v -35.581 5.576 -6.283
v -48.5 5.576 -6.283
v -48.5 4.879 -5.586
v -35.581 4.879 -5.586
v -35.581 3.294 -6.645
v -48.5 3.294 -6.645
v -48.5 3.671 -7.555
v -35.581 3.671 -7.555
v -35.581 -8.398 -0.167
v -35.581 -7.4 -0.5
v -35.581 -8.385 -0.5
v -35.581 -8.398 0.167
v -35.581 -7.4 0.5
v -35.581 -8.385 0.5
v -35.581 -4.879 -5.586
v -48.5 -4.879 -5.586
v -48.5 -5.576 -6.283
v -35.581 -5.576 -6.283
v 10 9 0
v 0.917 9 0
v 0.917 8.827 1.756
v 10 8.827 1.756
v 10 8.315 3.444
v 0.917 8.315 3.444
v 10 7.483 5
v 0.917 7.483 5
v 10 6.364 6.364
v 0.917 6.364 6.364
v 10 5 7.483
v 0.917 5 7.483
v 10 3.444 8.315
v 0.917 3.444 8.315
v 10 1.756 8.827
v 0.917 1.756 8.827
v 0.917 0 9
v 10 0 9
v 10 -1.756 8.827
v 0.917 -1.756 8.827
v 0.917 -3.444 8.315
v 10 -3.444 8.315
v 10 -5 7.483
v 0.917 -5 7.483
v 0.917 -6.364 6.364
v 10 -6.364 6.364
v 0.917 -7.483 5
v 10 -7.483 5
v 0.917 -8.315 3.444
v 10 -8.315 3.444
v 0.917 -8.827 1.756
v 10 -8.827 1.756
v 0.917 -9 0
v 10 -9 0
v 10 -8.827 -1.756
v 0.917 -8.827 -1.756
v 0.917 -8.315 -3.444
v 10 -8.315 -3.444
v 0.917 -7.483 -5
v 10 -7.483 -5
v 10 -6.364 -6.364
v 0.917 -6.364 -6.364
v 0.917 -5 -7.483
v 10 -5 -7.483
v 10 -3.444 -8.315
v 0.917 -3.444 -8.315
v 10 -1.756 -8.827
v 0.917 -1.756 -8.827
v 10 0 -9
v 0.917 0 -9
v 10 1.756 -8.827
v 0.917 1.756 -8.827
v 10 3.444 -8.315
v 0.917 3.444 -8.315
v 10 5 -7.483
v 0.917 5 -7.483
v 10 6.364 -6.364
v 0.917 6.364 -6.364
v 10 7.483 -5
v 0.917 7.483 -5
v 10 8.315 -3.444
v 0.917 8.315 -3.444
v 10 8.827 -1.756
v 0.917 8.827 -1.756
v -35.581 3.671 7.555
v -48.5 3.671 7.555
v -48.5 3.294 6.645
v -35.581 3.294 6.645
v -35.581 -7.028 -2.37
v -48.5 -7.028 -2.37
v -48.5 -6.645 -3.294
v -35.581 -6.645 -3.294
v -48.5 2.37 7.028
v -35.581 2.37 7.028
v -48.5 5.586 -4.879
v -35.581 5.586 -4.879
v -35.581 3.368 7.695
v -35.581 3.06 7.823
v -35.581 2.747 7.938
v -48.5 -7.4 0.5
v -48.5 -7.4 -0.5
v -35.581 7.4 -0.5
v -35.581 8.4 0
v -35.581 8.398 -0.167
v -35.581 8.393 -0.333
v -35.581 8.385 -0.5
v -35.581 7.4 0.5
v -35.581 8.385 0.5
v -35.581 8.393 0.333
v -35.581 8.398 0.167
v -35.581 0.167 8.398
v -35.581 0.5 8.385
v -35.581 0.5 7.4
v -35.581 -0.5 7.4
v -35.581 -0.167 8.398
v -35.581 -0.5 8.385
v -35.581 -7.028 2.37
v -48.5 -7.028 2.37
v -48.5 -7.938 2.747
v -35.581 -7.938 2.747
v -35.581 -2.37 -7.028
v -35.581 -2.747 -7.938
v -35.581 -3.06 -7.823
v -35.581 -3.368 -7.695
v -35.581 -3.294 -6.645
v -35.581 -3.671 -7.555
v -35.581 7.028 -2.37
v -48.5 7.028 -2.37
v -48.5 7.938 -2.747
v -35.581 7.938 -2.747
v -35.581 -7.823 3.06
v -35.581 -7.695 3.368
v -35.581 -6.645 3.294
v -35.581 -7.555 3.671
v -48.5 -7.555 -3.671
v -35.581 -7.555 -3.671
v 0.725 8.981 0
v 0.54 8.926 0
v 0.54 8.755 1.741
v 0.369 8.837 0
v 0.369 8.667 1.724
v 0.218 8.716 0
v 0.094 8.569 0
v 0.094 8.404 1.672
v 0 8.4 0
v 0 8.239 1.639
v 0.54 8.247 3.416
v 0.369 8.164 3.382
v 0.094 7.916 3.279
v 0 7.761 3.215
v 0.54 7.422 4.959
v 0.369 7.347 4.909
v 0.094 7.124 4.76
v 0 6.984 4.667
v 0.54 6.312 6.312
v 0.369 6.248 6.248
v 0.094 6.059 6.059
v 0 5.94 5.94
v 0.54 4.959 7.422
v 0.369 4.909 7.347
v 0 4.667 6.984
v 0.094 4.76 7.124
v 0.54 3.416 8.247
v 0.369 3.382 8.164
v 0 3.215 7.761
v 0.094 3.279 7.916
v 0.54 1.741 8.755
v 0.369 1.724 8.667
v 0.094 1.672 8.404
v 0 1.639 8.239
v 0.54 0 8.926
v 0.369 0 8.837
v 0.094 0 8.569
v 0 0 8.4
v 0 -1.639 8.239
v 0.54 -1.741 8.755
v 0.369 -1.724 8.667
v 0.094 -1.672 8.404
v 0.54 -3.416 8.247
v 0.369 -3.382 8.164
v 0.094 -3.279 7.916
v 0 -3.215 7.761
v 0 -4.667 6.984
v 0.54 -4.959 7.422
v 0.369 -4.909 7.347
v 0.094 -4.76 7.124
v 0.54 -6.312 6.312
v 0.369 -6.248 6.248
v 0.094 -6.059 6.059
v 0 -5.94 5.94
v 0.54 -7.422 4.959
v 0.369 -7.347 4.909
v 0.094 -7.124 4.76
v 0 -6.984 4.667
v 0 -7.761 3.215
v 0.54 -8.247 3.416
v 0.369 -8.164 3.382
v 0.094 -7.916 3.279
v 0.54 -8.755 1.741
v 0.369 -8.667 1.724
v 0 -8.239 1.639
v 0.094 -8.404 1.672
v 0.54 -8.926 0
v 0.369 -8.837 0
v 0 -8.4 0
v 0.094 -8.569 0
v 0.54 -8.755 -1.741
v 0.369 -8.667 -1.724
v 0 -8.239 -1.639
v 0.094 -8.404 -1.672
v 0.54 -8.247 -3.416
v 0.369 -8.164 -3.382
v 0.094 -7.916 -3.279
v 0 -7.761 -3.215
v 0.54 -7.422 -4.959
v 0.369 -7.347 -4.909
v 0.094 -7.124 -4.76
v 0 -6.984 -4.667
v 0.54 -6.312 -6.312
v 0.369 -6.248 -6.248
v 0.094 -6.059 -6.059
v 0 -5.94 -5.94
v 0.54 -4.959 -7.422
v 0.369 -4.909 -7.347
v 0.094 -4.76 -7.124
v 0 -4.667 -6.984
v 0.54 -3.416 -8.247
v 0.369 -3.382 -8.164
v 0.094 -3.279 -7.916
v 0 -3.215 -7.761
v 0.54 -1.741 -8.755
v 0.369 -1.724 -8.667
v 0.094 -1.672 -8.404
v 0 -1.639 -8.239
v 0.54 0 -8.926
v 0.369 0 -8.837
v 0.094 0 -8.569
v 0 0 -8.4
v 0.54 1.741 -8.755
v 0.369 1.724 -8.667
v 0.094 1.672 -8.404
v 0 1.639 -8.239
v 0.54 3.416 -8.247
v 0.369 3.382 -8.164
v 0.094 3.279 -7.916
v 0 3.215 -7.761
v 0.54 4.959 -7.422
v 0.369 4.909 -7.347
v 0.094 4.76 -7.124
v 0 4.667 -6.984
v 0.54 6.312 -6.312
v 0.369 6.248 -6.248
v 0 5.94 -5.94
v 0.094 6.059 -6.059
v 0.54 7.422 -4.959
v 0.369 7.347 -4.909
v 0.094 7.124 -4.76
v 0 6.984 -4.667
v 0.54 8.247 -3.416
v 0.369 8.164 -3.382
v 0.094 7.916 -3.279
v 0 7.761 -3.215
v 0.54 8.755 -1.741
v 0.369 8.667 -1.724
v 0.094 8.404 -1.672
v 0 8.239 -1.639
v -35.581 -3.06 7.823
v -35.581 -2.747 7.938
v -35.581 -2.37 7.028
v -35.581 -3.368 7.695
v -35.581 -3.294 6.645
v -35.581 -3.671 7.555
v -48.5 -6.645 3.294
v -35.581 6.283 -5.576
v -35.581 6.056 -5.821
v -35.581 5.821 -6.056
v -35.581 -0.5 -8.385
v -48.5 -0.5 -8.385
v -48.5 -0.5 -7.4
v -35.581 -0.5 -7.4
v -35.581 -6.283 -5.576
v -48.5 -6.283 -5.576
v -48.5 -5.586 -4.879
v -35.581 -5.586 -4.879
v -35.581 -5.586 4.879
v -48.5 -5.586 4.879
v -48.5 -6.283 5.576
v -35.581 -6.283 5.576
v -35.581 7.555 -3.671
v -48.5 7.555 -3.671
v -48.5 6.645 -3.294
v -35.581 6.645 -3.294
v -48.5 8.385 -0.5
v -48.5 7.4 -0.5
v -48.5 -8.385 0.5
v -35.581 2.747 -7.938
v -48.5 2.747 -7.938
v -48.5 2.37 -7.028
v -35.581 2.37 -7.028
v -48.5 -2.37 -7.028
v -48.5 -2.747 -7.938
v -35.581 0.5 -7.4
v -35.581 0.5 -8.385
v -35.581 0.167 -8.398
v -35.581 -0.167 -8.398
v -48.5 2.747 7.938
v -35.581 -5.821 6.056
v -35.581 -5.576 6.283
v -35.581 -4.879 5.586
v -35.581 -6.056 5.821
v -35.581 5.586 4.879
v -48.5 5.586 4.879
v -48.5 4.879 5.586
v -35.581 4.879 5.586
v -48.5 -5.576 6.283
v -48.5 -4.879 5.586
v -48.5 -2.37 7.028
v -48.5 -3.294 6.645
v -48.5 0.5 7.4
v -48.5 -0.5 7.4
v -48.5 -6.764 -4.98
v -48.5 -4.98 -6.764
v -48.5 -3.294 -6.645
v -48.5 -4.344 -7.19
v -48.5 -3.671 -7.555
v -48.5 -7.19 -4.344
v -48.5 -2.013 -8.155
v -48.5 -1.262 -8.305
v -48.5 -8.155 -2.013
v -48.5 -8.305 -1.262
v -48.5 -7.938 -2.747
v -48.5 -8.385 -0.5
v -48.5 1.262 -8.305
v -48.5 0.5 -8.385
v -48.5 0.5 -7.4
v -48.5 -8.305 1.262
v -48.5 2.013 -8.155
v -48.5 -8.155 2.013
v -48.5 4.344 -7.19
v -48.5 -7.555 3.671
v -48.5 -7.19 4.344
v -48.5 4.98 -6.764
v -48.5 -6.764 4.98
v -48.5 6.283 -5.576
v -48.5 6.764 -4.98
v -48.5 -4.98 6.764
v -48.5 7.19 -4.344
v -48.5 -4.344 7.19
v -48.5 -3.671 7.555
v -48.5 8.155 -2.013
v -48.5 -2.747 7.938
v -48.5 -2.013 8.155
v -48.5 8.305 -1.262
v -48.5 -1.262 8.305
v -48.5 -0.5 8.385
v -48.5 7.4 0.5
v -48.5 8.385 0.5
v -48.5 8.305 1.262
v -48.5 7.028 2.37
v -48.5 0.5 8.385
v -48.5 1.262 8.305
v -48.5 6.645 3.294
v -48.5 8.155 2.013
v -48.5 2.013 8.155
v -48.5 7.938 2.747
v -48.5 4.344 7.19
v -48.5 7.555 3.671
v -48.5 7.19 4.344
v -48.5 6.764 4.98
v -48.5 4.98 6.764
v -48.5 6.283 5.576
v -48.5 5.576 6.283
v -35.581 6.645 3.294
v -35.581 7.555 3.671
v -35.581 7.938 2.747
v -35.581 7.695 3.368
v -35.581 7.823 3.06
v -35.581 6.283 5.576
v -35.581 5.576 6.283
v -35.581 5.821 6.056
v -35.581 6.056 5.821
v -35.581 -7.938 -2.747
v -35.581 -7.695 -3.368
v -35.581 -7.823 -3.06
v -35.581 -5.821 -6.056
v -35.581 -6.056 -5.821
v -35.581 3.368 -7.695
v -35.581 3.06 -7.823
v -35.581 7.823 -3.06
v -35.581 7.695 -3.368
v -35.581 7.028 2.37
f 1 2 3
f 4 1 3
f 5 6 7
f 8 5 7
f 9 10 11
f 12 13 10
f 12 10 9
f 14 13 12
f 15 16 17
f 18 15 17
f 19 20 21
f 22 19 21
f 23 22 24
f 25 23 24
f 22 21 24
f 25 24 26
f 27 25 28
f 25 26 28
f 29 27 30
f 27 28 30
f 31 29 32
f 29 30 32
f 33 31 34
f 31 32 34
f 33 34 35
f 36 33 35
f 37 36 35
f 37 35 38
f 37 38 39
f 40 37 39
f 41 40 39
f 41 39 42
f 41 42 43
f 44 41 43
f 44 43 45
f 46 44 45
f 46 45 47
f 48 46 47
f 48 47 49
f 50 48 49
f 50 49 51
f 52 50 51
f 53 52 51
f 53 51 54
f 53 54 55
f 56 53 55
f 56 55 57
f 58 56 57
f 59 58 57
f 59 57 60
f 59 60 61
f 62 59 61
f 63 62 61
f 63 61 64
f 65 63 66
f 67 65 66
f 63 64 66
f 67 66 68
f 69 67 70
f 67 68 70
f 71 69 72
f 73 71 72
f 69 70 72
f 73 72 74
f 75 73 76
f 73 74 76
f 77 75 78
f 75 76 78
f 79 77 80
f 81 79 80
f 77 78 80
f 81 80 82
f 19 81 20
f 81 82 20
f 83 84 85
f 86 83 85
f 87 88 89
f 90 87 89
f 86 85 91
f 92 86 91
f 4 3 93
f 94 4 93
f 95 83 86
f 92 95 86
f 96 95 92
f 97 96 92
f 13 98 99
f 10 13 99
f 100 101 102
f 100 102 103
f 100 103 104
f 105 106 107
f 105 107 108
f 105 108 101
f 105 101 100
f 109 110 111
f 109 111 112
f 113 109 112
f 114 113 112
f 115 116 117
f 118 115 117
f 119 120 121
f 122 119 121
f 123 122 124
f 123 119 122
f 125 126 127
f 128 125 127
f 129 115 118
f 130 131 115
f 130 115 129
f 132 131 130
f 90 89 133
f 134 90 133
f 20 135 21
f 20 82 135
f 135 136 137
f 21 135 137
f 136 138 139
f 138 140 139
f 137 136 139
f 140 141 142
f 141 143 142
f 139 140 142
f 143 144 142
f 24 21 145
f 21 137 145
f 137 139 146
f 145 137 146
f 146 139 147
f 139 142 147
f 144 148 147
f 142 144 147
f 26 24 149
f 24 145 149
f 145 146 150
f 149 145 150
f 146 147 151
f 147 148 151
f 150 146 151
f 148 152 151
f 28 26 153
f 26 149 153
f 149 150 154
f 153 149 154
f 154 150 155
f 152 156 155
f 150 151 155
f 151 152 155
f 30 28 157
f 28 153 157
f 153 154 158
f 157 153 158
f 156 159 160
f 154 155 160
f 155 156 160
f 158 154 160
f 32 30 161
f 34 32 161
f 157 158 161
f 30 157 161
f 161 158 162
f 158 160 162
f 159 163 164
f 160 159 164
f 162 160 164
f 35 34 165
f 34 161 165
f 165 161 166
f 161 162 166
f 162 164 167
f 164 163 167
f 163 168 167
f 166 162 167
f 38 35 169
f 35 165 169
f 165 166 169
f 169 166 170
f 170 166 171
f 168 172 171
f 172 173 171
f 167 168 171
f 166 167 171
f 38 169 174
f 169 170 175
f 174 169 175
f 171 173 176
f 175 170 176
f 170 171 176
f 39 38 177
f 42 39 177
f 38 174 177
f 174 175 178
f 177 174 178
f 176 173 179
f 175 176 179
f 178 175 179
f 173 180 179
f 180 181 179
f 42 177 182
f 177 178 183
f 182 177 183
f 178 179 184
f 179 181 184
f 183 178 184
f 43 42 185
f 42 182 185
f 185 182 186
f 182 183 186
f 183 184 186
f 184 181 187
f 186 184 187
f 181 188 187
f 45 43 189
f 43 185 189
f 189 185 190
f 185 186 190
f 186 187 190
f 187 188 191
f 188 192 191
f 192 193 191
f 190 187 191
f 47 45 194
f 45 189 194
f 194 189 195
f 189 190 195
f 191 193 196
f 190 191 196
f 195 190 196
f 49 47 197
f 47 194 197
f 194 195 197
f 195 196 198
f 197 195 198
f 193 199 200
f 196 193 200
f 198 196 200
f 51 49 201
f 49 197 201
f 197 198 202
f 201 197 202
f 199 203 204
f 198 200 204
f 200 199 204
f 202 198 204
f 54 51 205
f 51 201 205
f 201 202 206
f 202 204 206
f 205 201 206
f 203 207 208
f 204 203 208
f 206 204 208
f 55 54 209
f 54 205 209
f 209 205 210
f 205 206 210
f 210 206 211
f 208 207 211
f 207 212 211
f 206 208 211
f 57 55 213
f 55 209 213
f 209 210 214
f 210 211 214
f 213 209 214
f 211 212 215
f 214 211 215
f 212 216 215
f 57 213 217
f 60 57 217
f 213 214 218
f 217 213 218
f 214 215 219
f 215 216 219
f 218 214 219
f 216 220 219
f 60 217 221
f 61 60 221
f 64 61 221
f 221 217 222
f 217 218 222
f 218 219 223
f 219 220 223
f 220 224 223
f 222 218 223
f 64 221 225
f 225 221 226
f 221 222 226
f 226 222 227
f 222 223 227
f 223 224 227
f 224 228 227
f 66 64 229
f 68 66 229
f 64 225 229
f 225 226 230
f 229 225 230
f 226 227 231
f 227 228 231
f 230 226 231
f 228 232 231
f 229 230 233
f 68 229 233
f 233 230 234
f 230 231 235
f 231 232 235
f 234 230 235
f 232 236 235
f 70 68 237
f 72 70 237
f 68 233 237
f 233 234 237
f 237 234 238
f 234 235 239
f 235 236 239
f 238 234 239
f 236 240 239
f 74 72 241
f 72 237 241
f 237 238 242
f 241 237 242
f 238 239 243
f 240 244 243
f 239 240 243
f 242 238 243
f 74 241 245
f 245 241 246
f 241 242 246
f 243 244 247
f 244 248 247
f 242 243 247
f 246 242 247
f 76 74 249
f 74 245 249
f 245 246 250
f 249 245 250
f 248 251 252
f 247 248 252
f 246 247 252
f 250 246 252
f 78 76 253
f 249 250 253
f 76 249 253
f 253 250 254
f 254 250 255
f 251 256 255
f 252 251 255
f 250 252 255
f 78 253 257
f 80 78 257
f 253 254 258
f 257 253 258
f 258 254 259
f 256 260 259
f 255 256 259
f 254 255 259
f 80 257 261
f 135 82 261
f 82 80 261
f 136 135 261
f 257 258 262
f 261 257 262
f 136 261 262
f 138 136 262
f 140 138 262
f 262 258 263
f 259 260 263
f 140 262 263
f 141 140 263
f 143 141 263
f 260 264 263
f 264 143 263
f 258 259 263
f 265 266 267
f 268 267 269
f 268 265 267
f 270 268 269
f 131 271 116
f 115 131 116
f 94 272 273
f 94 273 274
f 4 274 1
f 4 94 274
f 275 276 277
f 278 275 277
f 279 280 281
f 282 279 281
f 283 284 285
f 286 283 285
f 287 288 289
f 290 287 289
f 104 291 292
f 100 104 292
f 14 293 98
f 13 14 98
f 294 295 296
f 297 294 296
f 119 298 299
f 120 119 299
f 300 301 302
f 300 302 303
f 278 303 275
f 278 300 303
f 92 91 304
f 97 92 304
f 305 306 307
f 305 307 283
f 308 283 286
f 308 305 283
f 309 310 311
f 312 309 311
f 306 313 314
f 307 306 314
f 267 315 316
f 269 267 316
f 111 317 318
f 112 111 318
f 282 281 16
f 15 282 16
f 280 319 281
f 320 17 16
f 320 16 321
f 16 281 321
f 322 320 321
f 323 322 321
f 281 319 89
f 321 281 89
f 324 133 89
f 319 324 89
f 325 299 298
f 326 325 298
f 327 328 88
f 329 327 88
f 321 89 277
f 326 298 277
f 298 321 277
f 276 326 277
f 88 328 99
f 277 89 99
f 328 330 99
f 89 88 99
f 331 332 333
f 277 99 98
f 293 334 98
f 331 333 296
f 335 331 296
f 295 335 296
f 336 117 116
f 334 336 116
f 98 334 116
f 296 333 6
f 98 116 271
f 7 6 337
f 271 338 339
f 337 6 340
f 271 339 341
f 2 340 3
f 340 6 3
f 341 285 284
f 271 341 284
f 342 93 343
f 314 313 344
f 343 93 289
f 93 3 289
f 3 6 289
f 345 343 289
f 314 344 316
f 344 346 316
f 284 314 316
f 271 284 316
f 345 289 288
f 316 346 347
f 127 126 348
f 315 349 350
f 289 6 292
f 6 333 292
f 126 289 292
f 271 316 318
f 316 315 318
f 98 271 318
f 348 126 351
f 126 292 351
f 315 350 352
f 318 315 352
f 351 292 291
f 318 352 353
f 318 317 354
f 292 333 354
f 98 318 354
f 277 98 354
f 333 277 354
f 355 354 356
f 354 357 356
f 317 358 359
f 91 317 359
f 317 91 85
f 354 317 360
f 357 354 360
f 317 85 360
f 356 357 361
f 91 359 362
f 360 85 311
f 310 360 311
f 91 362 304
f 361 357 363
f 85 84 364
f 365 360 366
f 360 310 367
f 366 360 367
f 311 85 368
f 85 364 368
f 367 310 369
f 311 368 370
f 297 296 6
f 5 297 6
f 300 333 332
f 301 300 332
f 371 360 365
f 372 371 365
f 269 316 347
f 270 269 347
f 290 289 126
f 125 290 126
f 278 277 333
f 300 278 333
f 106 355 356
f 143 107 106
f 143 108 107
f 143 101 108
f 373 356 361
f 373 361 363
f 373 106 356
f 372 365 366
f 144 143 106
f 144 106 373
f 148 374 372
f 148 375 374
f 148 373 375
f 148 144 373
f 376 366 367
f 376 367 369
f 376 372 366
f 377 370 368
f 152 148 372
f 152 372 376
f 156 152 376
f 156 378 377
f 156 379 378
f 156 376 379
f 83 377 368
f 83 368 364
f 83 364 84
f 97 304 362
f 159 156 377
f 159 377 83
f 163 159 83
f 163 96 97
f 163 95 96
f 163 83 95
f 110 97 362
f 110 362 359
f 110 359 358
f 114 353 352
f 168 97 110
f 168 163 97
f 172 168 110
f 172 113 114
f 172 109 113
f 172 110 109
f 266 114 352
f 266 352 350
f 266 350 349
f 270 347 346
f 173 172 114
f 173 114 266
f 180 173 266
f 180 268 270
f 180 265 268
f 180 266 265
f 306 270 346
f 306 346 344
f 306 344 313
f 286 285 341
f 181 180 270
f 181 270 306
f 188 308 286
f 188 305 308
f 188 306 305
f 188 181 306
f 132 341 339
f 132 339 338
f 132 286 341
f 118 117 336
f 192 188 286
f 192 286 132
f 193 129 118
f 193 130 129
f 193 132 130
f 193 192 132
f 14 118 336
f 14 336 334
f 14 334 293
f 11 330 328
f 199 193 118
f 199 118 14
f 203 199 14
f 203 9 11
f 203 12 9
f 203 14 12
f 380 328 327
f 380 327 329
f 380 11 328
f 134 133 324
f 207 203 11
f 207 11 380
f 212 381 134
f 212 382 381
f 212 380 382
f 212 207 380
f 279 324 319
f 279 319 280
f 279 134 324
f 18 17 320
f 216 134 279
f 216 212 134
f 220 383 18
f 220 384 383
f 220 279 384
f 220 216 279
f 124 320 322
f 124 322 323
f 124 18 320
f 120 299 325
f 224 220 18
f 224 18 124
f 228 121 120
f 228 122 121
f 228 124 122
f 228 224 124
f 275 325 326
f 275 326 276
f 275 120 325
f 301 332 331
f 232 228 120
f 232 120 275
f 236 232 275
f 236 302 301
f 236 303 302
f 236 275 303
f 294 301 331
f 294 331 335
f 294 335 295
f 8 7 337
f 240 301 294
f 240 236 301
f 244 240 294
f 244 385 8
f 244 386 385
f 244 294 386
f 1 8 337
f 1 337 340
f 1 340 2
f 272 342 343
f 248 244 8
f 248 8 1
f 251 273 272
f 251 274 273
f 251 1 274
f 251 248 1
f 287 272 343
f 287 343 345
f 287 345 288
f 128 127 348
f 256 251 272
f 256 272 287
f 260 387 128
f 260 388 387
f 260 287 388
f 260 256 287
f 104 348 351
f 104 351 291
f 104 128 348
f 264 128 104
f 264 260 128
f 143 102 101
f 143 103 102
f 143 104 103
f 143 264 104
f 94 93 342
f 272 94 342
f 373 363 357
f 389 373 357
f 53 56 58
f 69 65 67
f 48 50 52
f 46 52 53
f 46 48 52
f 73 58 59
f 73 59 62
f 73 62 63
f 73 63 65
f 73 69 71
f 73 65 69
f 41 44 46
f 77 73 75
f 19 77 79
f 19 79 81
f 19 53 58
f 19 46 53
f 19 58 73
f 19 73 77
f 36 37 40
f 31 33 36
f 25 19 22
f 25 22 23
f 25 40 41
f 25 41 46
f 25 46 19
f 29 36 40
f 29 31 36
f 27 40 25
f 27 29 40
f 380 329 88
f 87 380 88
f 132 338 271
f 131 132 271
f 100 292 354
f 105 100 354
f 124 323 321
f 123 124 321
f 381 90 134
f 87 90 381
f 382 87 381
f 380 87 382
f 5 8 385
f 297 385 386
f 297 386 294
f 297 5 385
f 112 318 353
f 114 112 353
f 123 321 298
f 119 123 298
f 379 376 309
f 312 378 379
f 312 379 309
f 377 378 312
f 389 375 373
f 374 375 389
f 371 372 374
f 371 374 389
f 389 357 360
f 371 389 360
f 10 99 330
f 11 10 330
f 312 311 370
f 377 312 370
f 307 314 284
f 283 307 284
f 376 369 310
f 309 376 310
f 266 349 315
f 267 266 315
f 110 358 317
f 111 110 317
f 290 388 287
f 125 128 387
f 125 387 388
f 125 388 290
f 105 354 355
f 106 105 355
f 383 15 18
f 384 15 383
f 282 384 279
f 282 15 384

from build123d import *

# Parameters (mm, degrees)
F0_R     = 9
F1_DEPTH = 10
F2_R     = 8.4
F3_DEPTH = 48.5
F6_DEPTH = 12.919


# Not quite as in the source:
# - a fillet or chamfer that OpenCascade refuses, or shapes differently, is made with other operations: its cross-section is extruded or revolved along the edge and cut away or added


with BuildPart() as f1:
    # F0 (on Right) → F1 (new body)
    with BuildSketch(Plane.YZ):
        Circle(F0_R)
    extrude(amount=F1_DEPTH)

    # F2 (on Right) → F3 (join)
    with BuildSketch(Plane.YZ):
        Circle(F2_R)
    extrude(amount=-F3_DEPTH)

    # F4: fillet of radius 1 on 1 edges, made by hand

    # F4_s1 → F4_t2 (revolve, cut)
    with BuildSketch(Plane.XY):
        with BuildLine():
            ThreePointArc((0.916515139, 9), (0.3687925815, 8.8366600265), (0, 8.4))
            Line((0, 8.4), (0, 9))
            Line((0, 9), (0.916515139, 9))
        make_face()
    revolve(axis=Axis((0, 0, 0), (1, 0, 0)), mode=Mode.SUBTRACT)

    # F5 (on face) → F6 (cut)
    with BuildSketch(Plane(origin=(-48.5, 0, 0), x_dir=(0, -1, 0), z_dir=(-1, 0, 0))):
        with BuildLine():
            Line((0.5, 7.4), (0.5, 8.3851058431))
            ThreePointArc((0.5, 8.3851058431), (0, 8.4), (-0.5, 8.3851058431))
            Line((-0.5, 8.3851058431), (-0.5, 7.4))
            Line((-0.5, 7.4), (0.5, 7.4))
        make_face()
        with BuildLine():
            Line((-2.3699176332, 7.0280502568), (-2.7469013185, 7.9381693826))
            ThreePointArc((-2.7469013185, 7.9381693826), (-3.2145408319, 7.7605880731), (-3.670780851, 7.5554859502))
            Line((-3.670780851, 7.5554859502), (-3.2937971658, 6.6453668244))
            Line((-3.2937971658, 6.6453668244), (-2.3699176332, 7.0280502568))
        make_face()
        with BuildLine():
            Line((-4.8790367902, 5.5861435714), (-5.575611812, 6.2827185932))
            ThreePointArc((-5.575611812, 6.2827185932), (-5.939696962, 5.939696962), (-6.2827185932, 5.575611812))
            Line((-6.2827185932, 5.575611812), (-5.5861435714, 4.8790367902))
            Line((-5.5861435714, 4.8790367902), (-4.8790367902, 5.5861435714))
        make_face()
        with BuildLine():
            Line((-6.6453668244, 3.2937971658), (-7.5554859502, 3.670780851))
            ThreePointArc((-7.5554859502, 3.670780851), (-7.7605880731, 3.2145408319), (-7.9381693826, 2.7469013185))
            Line((-7.9381693826, 2.7469013185), (-7.0280502568, 2.3699176332))
            Line((-7.0280502568, 2.3699176332), (-6.6453668244, 3.2937971658))
        make_face()
        with BuildLine():
            Line((-7.4, 0.5), (-8.3851058431, 0.5))
            ThreePointArc((-8.3851058431, 0.5), (-8.4, 0), (-8.3851058431, -0.5))
            Line((-8.3851058431, -0.5), (-7.4, -0.5))
            Line((-7.4, -0.5), (-7.4, 0.5))
        make_face()
        with BuildLine():
            Line((-7.0280502568, -2.3699176332), (-7.9381693826, -2.7469013185))
            ThreePointArc((-7.9381693826, -2.7469013185), (-7.7605880731, -3.2145408319), (-7.5554859502, -3.670780851))
            Line((-7.5554859502, -3.670780851), (-6.6453668244, -3.2937971658))
            Line((-6.6453668244, -3.2937971658), (-7.0280502568, -2.3699176332))
        make_face()
        with BuildLine():
            Line((-5.5861435714, -4.8790367902), (-6.2827185932, -5.575611812))
            ThreePointArc((-6.2827185932, -5.575611812), (-5.939696962, -5.939696962), (-5.575611812, -6.2827185932))
            Line((-5.575611812, -6.2827185932), (-4.8790367902, -5.5861435714))
            Line((-4.8790367902, -5.5861435714), (-5.5861435714, -4.8790367902))
        make_face()
        with BuildLine():
            Line((-3.2937971658, -6.6453668244), (-3.670780851, -7.5554859502))
            ThreePointArc((-3.670780851, -7.5554859502), (-3.2145408319, -7.7605880731), (-2.7469013185, -7.9381693826))
            Line((-2.7469013185, -7.9381693826), (-2.3699176332, -7.0280502568))
            Line((-2.3699176332, -7.0280502568), (-3.2937971658, -6.6453668244))
        make_face()
        with BuildLine():
            Line((-0.5, -7.4), (-0.5, -8.3851058431))
            ThreePointArc((-0.5, -8.3851058431), (0, -8.4), (0.5, -8.3851058431))
            Line((0.5, -8.3851058431), (0.5, -7.4))
            Line((0.5, -7.4), (-0.5, -7.4))
        make_face()
        with BuildLine():
            Line((2.3699176332, -7.0280502568), (2.7469013185, -7.9381693826))
            ThreePointArc((2.7469013185, -7.9381693826), (3.2145408319, -7.7605880731), (3.670780851, -7.5554859502))
            Line((3.670780851, -7.5554859502), (3.2937971658, -6.6453668244))
            Line((3.2937971658, -6.6453668244), (2.3699176332, -7.0280502568))
        make_face()
        with BuildLine():
            Line((4.8790367902, -5.5861435714), (5.575611812, -6.2827185932))
            ThreePointArc((5.575611812, -6.2827185932), (5.939696962, -5.939696962), (6.2827185932, -5.575611812))
            Line((6.2827185932, -5.575611812), (5.5861435714, -4.8790367902))
            Line((5.5861435714, -4.8790367902), (4.8790367902, -5.5861435714))
        make_face()
        with BuildLine():
            Line((6.6453668244, -3.2937971658), (7.5554859502, -3.670780851))
            ThreePointArc((7.5554859502, -3.670780851), (7.7605880731, -3.2145408319), (7.9381693826, -2.7469013185))
            Line((7.9381693826, -2.7469013185), (7.0280502568, -2.3699176332))
            Line((7.0280502568, -2.3699176332), (6.6453668244, -3.2937971658))
        make_face()
        with BuildLine():
            Line((7.4, -0.5), (8.3851058431, -0.5))
            ThreePointArc((8.3851058431, -0.5), (8.4, 0), (8.3851058431, 0.5))
            Line((8.3851058431, 0.5), (7.4, 0.5))
            Line((7.4, 0.5), (7.4, -0.5))
        make_face()
        with BuildLine():
            Line((7.0280502568, 2.3699176332), (7.9381693826, 2.7469013185))
            ThreePointArc((7.9381693826, 2.7469013185), (7.7605880731, 3.2145408319), (7.5554859502, 3.670780851))
            Line((7.5554859502, 3.670780851), (6.6453668244, 3.2937971658))
            Line((6.6453668244, 3.2937971658), (7.0280502568, 2.3699176332))
        make_face()
        with BuildLine():
            Line((5.5861435714, 4.8790367902), (6.2827185932, 5.575611812))
            ThreePointArc((6.2827185932, 5.575611812), (5.939696962, 5.939696962), (5.575611812, 6.2827185932))
            Line((5.575611812, 6.2827185932), (4.8790367902, 5.5861435714))
            Line((4.8790367902, 5.5861435714), (5.5861435714, 4.8790367902))
        make_face()
        with BuildLine():
            Line((3.2937971658, 6.6453668244), (3.670780851, 7.5554859502))
            ThreePointArc((3.670780851, 7.5554859502), (3.2145408319, 7.7605880731), (2.7469013185, 7.9381693826))
            Line((2.7469013185, 7.9381693826), (2.3699176332, 7.0280502568))
            Line((2.3699176332, 7.0280502568), (3.2937971658, 6.6453668244))
        make_face()
    extrude(amount=-F6_DEPTH, mode=Mode.SUBTRACT)


solid = f1.part
